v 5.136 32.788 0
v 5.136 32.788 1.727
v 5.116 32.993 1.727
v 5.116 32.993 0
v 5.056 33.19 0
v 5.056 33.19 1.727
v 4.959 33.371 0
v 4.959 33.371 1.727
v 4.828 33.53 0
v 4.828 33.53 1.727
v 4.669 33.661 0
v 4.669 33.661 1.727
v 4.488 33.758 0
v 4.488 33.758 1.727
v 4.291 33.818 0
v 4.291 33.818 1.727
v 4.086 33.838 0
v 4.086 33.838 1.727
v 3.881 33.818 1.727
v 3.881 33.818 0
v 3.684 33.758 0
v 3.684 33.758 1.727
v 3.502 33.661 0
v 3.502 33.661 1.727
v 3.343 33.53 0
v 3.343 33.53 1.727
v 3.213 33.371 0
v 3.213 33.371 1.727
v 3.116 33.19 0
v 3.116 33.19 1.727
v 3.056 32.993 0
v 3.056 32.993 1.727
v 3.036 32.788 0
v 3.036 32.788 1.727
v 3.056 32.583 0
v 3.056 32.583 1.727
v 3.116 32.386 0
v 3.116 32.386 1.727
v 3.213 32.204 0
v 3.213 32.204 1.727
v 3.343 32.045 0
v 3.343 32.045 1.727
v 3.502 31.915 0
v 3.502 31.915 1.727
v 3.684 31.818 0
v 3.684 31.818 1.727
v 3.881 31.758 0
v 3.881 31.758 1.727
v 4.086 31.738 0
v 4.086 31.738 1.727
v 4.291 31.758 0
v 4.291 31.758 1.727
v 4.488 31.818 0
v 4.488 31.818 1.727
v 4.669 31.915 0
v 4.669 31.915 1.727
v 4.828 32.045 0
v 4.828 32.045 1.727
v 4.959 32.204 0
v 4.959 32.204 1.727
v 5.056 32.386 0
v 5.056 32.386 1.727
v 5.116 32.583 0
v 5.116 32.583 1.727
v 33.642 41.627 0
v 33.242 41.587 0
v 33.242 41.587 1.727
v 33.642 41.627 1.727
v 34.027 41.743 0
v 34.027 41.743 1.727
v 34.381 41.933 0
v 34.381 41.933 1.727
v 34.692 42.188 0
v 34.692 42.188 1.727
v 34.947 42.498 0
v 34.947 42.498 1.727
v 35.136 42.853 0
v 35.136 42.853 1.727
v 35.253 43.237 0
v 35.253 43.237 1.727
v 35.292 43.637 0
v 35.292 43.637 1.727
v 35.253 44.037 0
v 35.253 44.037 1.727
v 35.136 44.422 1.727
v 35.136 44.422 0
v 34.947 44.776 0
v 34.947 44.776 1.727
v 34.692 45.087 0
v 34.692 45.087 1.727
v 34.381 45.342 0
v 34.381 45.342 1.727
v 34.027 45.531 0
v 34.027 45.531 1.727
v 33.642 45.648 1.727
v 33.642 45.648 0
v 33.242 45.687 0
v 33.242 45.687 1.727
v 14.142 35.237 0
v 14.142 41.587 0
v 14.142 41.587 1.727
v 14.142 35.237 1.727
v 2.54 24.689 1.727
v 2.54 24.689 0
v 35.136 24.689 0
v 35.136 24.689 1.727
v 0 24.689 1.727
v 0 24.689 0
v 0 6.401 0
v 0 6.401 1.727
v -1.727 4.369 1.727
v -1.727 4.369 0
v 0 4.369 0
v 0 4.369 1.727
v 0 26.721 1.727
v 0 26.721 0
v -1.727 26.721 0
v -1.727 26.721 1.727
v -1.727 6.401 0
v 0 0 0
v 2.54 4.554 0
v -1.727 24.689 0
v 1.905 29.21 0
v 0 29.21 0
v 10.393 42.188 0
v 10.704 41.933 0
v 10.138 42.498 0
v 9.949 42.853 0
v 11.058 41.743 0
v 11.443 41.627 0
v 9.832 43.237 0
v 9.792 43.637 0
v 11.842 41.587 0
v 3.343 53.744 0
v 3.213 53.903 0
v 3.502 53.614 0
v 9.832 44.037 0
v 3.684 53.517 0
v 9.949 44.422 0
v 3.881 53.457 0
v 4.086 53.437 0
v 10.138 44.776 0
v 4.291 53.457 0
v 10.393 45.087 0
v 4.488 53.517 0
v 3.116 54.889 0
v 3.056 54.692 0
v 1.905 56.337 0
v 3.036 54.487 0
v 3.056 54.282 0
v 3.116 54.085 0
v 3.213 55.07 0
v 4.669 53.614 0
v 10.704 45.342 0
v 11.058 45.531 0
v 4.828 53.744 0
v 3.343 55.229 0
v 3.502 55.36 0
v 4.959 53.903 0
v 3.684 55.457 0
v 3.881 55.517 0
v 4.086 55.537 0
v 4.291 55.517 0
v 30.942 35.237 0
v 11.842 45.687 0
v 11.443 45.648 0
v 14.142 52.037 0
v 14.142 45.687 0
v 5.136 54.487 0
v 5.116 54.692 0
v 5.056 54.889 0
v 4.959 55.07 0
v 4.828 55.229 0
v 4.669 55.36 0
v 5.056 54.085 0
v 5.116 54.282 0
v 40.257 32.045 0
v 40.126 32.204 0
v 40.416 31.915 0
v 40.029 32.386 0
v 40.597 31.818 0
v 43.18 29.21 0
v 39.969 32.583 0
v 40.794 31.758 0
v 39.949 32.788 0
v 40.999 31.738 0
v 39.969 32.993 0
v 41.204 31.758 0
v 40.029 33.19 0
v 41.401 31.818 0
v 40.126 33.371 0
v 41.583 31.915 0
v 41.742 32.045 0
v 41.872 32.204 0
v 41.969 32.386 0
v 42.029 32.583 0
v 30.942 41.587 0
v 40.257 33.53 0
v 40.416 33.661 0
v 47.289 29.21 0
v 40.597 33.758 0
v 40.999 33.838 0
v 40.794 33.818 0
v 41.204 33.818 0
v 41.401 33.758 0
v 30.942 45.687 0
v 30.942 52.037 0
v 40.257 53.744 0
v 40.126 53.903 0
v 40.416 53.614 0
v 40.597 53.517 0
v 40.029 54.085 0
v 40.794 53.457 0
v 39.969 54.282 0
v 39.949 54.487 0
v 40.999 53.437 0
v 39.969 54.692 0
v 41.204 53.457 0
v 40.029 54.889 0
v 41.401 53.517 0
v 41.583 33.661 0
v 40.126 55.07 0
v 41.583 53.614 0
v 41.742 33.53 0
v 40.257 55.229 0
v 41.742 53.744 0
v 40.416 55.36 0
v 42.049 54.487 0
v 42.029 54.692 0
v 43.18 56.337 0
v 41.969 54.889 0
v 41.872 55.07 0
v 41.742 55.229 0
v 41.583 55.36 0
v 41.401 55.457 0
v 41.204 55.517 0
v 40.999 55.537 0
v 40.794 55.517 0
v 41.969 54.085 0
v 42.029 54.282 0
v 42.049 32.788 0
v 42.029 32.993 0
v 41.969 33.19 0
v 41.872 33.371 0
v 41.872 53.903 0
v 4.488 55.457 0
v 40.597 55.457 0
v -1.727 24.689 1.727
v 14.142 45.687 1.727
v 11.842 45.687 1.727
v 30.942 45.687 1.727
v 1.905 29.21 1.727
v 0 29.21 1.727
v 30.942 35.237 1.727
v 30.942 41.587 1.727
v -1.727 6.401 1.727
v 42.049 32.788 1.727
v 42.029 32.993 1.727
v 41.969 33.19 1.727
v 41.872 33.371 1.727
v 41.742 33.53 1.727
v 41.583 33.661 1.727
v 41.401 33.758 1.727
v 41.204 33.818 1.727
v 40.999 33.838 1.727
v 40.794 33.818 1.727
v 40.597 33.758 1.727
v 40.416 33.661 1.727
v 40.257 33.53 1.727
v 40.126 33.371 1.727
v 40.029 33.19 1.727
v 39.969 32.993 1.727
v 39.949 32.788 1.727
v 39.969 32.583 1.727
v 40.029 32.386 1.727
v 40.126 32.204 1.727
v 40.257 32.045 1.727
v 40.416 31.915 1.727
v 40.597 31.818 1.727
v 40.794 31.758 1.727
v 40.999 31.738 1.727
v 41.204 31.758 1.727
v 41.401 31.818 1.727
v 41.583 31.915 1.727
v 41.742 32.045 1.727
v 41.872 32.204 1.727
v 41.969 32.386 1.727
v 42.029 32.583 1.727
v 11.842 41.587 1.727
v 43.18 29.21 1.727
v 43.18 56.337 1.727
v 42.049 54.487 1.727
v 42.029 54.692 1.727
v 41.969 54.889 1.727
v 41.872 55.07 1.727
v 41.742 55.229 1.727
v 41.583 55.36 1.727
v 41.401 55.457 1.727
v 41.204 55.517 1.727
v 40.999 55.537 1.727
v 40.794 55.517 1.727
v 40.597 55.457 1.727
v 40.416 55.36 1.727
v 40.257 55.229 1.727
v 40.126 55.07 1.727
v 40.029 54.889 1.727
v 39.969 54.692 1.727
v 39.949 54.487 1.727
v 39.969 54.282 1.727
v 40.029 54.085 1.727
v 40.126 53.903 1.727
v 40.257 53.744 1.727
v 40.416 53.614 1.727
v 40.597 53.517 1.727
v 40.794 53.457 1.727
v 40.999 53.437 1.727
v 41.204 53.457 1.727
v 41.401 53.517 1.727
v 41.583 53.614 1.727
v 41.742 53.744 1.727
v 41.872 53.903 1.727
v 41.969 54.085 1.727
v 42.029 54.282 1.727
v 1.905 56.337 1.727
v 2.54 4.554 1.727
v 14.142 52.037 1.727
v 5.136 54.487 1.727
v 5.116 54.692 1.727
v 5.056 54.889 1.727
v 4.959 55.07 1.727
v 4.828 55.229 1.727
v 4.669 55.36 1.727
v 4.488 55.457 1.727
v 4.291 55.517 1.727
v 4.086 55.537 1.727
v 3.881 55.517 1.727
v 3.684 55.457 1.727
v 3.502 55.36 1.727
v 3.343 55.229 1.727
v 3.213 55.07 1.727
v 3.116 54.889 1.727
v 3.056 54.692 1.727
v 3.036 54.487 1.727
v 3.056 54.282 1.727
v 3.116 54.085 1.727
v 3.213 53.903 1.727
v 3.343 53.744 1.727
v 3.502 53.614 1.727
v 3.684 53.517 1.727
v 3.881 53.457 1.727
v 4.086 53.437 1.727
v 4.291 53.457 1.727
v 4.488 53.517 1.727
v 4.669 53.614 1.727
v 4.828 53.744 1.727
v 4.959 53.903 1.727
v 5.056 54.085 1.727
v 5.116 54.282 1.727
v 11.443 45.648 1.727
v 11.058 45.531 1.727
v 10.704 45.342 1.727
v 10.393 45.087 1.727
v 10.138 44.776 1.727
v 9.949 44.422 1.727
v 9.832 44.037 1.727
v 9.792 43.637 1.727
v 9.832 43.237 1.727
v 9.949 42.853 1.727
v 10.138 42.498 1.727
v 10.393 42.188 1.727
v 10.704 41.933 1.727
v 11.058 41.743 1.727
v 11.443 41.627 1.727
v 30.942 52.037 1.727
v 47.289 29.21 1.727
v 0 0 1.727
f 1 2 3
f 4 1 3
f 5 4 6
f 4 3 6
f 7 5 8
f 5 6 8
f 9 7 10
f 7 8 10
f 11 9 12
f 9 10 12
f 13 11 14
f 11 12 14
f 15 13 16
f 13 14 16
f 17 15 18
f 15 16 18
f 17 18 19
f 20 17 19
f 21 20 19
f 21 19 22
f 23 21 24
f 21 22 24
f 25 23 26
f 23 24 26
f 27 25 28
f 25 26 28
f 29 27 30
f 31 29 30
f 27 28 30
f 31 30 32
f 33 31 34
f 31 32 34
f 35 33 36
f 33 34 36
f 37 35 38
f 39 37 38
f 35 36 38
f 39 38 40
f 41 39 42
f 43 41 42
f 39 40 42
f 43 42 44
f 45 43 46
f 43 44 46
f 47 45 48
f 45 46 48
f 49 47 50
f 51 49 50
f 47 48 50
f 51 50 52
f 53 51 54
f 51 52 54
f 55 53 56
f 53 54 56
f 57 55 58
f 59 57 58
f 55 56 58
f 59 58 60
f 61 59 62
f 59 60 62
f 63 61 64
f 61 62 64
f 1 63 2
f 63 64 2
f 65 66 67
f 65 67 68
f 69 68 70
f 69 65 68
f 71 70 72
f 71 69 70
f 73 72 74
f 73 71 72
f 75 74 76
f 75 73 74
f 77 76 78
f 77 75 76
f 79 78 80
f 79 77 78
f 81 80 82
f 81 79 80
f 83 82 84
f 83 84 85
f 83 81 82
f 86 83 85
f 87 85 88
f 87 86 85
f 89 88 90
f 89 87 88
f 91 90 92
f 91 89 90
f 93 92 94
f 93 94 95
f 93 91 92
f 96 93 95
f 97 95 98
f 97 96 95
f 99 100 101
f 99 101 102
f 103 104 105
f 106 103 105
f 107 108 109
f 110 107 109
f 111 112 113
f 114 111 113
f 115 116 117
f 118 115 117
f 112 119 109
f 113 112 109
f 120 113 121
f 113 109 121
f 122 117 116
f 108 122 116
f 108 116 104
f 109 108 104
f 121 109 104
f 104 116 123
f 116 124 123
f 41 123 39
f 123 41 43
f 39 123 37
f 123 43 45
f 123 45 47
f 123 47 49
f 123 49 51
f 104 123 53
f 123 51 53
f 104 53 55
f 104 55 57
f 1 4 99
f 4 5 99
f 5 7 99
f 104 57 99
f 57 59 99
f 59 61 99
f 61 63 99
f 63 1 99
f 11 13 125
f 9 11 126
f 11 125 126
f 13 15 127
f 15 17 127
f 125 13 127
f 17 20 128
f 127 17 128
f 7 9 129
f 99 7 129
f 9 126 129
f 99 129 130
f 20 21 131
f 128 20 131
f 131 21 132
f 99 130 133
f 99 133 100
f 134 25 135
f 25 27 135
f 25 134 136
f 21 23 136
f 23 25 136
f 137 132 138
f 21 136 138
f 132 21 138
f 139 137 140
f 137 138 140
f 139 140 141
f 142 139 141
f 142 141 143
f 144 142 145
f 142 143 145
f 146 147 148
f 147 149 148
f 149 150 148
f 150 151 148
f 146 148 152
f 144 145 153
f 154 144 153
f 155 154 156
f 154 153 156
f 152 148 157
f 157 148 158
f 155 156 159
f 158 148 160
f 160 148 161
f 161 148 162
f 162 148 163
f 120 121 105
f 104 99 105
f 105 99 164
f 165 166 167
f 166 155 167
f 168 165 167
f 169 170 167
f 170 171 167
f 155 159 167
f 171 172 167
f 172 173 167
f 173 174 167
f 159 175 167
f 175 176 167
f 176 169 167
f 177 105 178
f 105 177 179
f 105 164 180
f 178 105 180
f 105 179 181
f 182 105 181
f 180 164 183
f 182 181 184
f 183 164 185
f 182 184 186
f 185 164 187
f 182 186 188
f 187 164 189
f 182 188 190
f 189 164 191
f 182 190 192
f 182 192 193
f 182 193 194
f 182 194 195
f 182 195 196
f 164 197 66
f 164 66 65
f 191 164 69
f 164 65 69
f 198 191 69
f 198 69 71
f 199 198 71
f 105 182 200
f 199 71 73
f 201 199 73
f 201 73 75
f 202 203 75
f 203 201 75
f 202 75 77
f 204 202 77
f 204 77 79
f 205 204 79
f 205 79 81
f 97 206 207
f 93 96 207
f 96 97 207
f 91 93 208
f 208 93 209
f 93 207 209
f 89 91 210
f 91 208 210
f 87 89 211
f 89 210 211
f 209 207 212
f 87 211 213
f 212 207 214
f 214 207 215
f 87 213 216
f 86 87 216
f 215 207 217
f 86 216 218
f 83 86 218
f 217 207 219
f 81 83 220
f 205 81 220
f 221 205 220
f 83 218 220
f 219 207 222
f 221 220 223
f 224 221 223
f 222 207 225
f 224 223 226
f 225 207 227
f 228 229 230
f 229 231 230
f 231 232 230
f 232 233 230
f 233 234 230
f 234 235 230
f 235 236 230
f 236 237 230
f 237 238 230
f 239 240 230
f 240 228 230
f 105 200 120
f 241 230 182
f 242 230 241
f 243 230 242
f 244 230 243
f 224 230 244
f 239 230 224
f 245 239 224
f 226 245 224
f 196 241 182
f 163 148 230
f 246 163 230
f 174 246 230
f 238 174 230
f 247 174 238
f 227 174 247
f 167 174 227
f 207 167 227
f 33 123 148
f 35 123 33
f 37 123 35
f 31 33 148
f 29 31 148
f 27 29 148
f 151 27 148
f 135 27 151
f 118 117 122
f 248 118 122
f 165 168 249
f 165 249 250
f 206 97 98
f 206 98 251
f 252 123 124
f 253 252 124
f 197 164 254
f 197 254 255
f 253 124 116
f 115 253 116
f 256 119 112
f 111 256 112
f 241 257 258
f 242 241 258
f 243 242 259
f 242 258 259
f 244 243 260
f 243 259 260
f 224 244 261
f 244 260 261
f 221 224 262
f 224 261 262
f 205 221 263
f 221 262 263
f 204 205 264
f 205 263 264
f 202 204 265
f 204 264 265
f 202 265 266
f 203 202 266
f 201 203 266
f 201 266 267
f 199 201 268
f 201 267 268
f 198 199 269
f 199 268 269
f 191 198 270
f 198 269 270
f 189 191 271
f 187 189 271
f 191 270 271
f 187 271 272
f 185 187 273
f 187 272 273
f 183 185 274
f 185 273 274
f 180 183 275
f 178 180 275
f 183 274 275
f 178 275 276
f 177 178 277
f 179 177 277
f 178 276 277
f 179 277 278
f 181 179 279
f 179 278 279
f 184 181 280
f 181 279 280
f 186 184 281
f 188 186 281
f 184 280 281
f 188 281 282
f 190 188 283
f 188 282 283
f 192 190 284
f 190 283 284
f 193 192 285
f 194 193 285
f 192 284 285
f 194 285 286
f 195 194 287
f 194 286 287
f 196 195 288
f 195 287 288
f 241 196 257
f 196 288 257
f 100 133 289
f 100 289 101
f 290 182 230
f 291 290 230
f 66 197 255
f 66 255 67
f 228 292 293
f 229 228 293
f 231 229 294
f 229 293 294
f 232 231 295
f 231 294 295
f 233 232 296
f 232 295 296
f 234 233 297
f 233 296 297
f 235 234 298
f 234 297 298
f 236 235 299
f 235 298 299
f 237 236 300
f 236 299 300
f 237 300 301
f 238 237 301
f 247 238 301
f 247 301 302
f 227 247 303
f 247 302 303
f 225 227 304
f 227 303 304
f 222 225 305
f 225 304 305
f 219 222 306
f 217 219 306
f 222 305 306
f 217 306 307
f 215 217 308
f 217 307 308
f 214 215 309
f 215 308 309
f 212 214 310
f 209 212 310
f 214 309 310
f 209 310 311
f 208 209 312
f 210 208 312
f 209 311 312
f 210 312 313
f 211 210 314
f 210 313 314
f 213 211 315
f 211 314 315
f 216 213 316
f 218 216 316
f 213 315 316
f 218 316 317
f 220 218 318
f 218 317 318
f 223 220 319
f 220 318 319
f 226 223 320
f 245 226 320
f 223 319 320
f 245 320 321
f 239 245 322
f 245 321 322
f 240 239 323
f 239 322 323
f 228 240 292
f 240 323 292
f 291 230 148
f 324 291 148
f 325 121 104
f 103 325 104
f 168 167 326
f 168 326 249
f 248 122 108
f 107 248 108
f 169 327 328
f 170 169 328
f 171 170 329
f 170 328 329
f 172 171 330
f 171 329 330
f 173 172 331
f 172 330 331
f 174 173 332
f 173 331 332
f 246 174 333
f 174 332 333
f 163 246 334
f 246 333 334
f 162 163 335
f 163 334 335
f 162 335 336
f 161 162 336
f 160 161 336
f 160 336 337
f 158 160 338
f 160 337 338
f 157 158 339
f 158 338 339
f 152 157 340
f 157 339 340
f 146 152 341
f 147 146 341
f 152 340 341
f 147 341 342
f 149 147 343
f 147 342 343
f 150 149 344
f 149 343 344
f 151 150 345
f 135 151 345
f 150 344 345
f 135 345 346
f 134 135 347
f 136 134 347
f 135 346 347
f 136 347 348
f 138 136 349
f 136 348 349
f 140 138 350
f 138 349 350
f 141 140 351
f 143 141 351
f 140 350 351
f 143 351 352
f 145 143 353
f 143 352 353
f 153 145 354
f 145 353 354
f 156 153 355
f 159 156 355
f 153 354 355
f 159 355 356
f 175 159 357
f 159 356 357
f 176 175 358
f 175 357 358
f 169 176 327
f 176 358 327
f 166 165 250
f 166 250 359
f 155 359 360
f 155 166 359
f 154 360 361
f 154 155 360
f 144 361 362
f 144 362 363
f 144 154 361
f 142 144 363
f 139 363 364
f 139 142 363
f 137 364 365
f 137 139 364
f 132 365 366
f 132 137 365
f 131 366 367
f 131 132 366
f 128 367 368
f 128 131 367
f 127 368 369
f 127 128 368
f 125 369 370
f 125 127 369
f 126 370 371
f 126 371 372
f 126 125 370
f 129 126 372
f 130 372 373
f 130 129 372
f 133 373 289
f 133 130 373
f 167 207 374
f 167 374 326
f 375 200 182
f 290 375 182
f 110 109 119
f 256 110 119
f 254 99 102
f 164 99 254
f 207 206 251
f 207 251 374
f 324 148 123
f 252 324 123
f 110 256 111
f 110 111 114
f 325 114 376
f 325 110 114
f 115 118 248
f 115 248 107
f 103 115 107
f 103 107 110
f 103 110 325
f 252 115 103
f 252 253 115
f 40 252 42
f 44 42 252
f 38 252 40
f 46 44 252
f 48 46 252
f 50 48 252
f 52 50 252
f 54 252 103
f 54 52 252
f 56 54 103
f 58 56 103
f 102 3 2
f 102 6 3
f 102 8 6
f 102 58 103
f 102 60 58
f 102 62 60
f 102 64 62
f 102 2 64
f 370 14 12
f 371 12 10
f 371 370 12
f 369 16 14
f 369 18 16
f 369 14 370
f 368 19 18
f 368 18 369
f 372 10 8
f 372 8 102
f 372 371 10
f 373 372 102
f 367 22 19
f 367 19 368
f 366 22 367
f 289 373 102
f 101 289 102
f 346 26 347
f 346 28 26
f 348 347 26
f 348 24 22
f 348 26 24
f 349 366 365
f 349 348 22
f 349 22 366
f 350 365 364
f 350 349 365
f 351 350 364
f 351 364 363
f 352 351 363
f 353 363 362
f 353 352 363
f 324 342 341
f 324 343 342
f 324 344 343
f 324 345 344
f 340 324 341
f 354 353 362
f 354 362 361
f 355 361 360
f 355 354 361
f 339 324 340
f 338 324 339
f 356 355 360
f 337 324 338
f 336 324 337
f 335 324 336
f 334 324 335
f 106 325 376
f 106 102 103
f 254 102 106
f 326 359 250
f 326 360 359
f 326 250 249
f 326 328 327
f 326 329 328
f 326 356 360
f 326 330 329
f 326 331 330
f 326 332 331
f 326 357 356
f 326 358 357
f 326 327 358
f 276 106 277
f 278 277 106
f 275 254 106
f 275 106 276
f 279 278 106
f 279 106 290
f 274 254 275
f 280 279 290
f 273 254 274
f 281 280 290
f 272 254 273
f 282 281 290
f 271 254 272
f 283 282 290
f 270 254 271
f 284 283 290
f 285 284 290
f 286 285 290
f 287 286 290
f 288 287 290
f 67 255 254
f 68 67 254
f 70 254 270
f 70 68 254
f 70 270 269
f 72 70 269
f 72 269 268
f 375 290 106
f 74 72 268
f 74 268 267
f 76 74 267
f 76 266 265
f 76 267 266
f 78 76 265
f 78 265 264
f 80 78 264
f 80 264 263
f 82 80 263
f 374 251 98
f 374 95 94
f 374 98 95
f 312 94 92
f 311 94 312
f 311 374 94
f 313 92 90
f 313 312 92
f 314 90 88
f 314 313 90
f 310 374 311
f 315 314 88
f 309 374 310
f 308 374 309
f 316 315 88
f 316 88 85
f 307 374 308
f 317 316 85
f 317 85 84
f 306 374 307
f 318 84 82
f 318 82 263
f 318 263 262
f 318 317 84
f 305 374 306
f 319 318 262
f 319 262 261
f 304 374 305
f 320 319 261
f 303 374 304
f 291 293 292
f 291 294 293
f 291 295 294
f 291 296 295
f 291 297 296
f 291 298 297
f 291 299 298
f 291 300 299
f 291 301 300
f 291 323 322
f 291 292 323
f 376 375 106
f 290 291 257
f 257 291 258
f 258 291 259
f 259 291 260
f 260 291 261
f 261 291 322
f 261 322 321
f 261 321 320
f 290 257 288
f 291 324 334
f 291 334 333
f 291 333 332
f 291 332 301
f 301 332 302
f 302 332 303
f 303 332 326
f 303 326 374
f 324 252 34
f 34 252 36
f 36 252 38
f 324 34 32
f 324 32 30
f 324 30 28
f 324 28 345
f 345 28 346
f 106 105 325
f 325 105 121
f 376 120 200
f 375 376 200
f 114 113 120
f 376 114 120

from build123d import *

# Parameters (mm, degrees)
BOSS_EXTRUDE1_DEPTH = 1.7272
SKETCH3_R           = 1.05
CUT_EXTRUDE1_DEPTH  = 1.7272


with BuildPart() as part:
    # Sketch1 → Boss-Extrude1 (new body)
    with BuildSketch(Plane.XY):
        Polygon((0, 0), (47.288728977, 29.21), (43.18, 29.21), (43.18, 56.3372), (1.905, 56.3372), (1.905, 29.21), (0, 29.21), (0, 26.7208), (-1.7272, 26.7208), (-1.7272, 24.6888), (0, 24.6888), (0, 6.4008), (-1.7272, 6.4008), (-1.7272, 4.3688), (0, 4.3688), align=None)
        Polygon((2.54, 24.6888), (35.135968928, 24.6888), (2.54, 4.554440863), align=None, mode=Mode.SUBTRACT)
        with BuildLine():
            Line((14.1425, 41.5872), (14.1425, 35.2372))
            Line((14.1425, 35.2372), (30.9425, 35.2372))
            Line((30.9425, 35.2372), (30.9425, 41.5872))
            Line((30.9425, 41.5872), (33.2425, 41.5872))
            ThreePointArc((33.2425, 41.5872), (35.2925, 43.6372), (33.2425, 45.6872))
            Line((33.2425, 45.6872), (30.9425, 45.6872))
            Line((30.9425, 45.6872), (30.9425, 52.0372))
            Line((30.9425, 52.0372), (14.1425, 52.0372))
            Line((14.1425, 52.0372), (14.1425, 45.6872))
            Line((14.1425, 45.6872), (11.8425, 45.6872))
            ThreePointArc((11.8425, 45.6872), (9.7925, 43.6372), (11.8425, 41.5872))
            Line((11.8425, 41.5872), (14.1425, 41.5872))
        make_face(mode=Mode.SUBTRACT)
    extrude(amount=BOSS_EXTRUDE1_DEPTH)

    # Sketch3 → Cut-Extrude1 (cut)
    with BuildSketch(Plane(origin=(22.5425, 43.6372, 1.7272), x_dir=(1, 0, 0), z_dir=(0, 0, 1))):
        with Locations((-18.4568, 10.8495)):
            Circle(SKETCH3_R)
        with Locations((-18.4568, -10.8495)):
            Circle(SKETCH3_R)
        with Locations((18.4568, -10.8495)):
            Circle(SKETCH3_R)
        with Locations((18.4568, 10.8495)):
            Circle(SKETCH3_R)
    extrude(amount=-CUT_EXTRUDE1_DEPTH, mode=Mode.SUBTRACT)


solid = part.part
